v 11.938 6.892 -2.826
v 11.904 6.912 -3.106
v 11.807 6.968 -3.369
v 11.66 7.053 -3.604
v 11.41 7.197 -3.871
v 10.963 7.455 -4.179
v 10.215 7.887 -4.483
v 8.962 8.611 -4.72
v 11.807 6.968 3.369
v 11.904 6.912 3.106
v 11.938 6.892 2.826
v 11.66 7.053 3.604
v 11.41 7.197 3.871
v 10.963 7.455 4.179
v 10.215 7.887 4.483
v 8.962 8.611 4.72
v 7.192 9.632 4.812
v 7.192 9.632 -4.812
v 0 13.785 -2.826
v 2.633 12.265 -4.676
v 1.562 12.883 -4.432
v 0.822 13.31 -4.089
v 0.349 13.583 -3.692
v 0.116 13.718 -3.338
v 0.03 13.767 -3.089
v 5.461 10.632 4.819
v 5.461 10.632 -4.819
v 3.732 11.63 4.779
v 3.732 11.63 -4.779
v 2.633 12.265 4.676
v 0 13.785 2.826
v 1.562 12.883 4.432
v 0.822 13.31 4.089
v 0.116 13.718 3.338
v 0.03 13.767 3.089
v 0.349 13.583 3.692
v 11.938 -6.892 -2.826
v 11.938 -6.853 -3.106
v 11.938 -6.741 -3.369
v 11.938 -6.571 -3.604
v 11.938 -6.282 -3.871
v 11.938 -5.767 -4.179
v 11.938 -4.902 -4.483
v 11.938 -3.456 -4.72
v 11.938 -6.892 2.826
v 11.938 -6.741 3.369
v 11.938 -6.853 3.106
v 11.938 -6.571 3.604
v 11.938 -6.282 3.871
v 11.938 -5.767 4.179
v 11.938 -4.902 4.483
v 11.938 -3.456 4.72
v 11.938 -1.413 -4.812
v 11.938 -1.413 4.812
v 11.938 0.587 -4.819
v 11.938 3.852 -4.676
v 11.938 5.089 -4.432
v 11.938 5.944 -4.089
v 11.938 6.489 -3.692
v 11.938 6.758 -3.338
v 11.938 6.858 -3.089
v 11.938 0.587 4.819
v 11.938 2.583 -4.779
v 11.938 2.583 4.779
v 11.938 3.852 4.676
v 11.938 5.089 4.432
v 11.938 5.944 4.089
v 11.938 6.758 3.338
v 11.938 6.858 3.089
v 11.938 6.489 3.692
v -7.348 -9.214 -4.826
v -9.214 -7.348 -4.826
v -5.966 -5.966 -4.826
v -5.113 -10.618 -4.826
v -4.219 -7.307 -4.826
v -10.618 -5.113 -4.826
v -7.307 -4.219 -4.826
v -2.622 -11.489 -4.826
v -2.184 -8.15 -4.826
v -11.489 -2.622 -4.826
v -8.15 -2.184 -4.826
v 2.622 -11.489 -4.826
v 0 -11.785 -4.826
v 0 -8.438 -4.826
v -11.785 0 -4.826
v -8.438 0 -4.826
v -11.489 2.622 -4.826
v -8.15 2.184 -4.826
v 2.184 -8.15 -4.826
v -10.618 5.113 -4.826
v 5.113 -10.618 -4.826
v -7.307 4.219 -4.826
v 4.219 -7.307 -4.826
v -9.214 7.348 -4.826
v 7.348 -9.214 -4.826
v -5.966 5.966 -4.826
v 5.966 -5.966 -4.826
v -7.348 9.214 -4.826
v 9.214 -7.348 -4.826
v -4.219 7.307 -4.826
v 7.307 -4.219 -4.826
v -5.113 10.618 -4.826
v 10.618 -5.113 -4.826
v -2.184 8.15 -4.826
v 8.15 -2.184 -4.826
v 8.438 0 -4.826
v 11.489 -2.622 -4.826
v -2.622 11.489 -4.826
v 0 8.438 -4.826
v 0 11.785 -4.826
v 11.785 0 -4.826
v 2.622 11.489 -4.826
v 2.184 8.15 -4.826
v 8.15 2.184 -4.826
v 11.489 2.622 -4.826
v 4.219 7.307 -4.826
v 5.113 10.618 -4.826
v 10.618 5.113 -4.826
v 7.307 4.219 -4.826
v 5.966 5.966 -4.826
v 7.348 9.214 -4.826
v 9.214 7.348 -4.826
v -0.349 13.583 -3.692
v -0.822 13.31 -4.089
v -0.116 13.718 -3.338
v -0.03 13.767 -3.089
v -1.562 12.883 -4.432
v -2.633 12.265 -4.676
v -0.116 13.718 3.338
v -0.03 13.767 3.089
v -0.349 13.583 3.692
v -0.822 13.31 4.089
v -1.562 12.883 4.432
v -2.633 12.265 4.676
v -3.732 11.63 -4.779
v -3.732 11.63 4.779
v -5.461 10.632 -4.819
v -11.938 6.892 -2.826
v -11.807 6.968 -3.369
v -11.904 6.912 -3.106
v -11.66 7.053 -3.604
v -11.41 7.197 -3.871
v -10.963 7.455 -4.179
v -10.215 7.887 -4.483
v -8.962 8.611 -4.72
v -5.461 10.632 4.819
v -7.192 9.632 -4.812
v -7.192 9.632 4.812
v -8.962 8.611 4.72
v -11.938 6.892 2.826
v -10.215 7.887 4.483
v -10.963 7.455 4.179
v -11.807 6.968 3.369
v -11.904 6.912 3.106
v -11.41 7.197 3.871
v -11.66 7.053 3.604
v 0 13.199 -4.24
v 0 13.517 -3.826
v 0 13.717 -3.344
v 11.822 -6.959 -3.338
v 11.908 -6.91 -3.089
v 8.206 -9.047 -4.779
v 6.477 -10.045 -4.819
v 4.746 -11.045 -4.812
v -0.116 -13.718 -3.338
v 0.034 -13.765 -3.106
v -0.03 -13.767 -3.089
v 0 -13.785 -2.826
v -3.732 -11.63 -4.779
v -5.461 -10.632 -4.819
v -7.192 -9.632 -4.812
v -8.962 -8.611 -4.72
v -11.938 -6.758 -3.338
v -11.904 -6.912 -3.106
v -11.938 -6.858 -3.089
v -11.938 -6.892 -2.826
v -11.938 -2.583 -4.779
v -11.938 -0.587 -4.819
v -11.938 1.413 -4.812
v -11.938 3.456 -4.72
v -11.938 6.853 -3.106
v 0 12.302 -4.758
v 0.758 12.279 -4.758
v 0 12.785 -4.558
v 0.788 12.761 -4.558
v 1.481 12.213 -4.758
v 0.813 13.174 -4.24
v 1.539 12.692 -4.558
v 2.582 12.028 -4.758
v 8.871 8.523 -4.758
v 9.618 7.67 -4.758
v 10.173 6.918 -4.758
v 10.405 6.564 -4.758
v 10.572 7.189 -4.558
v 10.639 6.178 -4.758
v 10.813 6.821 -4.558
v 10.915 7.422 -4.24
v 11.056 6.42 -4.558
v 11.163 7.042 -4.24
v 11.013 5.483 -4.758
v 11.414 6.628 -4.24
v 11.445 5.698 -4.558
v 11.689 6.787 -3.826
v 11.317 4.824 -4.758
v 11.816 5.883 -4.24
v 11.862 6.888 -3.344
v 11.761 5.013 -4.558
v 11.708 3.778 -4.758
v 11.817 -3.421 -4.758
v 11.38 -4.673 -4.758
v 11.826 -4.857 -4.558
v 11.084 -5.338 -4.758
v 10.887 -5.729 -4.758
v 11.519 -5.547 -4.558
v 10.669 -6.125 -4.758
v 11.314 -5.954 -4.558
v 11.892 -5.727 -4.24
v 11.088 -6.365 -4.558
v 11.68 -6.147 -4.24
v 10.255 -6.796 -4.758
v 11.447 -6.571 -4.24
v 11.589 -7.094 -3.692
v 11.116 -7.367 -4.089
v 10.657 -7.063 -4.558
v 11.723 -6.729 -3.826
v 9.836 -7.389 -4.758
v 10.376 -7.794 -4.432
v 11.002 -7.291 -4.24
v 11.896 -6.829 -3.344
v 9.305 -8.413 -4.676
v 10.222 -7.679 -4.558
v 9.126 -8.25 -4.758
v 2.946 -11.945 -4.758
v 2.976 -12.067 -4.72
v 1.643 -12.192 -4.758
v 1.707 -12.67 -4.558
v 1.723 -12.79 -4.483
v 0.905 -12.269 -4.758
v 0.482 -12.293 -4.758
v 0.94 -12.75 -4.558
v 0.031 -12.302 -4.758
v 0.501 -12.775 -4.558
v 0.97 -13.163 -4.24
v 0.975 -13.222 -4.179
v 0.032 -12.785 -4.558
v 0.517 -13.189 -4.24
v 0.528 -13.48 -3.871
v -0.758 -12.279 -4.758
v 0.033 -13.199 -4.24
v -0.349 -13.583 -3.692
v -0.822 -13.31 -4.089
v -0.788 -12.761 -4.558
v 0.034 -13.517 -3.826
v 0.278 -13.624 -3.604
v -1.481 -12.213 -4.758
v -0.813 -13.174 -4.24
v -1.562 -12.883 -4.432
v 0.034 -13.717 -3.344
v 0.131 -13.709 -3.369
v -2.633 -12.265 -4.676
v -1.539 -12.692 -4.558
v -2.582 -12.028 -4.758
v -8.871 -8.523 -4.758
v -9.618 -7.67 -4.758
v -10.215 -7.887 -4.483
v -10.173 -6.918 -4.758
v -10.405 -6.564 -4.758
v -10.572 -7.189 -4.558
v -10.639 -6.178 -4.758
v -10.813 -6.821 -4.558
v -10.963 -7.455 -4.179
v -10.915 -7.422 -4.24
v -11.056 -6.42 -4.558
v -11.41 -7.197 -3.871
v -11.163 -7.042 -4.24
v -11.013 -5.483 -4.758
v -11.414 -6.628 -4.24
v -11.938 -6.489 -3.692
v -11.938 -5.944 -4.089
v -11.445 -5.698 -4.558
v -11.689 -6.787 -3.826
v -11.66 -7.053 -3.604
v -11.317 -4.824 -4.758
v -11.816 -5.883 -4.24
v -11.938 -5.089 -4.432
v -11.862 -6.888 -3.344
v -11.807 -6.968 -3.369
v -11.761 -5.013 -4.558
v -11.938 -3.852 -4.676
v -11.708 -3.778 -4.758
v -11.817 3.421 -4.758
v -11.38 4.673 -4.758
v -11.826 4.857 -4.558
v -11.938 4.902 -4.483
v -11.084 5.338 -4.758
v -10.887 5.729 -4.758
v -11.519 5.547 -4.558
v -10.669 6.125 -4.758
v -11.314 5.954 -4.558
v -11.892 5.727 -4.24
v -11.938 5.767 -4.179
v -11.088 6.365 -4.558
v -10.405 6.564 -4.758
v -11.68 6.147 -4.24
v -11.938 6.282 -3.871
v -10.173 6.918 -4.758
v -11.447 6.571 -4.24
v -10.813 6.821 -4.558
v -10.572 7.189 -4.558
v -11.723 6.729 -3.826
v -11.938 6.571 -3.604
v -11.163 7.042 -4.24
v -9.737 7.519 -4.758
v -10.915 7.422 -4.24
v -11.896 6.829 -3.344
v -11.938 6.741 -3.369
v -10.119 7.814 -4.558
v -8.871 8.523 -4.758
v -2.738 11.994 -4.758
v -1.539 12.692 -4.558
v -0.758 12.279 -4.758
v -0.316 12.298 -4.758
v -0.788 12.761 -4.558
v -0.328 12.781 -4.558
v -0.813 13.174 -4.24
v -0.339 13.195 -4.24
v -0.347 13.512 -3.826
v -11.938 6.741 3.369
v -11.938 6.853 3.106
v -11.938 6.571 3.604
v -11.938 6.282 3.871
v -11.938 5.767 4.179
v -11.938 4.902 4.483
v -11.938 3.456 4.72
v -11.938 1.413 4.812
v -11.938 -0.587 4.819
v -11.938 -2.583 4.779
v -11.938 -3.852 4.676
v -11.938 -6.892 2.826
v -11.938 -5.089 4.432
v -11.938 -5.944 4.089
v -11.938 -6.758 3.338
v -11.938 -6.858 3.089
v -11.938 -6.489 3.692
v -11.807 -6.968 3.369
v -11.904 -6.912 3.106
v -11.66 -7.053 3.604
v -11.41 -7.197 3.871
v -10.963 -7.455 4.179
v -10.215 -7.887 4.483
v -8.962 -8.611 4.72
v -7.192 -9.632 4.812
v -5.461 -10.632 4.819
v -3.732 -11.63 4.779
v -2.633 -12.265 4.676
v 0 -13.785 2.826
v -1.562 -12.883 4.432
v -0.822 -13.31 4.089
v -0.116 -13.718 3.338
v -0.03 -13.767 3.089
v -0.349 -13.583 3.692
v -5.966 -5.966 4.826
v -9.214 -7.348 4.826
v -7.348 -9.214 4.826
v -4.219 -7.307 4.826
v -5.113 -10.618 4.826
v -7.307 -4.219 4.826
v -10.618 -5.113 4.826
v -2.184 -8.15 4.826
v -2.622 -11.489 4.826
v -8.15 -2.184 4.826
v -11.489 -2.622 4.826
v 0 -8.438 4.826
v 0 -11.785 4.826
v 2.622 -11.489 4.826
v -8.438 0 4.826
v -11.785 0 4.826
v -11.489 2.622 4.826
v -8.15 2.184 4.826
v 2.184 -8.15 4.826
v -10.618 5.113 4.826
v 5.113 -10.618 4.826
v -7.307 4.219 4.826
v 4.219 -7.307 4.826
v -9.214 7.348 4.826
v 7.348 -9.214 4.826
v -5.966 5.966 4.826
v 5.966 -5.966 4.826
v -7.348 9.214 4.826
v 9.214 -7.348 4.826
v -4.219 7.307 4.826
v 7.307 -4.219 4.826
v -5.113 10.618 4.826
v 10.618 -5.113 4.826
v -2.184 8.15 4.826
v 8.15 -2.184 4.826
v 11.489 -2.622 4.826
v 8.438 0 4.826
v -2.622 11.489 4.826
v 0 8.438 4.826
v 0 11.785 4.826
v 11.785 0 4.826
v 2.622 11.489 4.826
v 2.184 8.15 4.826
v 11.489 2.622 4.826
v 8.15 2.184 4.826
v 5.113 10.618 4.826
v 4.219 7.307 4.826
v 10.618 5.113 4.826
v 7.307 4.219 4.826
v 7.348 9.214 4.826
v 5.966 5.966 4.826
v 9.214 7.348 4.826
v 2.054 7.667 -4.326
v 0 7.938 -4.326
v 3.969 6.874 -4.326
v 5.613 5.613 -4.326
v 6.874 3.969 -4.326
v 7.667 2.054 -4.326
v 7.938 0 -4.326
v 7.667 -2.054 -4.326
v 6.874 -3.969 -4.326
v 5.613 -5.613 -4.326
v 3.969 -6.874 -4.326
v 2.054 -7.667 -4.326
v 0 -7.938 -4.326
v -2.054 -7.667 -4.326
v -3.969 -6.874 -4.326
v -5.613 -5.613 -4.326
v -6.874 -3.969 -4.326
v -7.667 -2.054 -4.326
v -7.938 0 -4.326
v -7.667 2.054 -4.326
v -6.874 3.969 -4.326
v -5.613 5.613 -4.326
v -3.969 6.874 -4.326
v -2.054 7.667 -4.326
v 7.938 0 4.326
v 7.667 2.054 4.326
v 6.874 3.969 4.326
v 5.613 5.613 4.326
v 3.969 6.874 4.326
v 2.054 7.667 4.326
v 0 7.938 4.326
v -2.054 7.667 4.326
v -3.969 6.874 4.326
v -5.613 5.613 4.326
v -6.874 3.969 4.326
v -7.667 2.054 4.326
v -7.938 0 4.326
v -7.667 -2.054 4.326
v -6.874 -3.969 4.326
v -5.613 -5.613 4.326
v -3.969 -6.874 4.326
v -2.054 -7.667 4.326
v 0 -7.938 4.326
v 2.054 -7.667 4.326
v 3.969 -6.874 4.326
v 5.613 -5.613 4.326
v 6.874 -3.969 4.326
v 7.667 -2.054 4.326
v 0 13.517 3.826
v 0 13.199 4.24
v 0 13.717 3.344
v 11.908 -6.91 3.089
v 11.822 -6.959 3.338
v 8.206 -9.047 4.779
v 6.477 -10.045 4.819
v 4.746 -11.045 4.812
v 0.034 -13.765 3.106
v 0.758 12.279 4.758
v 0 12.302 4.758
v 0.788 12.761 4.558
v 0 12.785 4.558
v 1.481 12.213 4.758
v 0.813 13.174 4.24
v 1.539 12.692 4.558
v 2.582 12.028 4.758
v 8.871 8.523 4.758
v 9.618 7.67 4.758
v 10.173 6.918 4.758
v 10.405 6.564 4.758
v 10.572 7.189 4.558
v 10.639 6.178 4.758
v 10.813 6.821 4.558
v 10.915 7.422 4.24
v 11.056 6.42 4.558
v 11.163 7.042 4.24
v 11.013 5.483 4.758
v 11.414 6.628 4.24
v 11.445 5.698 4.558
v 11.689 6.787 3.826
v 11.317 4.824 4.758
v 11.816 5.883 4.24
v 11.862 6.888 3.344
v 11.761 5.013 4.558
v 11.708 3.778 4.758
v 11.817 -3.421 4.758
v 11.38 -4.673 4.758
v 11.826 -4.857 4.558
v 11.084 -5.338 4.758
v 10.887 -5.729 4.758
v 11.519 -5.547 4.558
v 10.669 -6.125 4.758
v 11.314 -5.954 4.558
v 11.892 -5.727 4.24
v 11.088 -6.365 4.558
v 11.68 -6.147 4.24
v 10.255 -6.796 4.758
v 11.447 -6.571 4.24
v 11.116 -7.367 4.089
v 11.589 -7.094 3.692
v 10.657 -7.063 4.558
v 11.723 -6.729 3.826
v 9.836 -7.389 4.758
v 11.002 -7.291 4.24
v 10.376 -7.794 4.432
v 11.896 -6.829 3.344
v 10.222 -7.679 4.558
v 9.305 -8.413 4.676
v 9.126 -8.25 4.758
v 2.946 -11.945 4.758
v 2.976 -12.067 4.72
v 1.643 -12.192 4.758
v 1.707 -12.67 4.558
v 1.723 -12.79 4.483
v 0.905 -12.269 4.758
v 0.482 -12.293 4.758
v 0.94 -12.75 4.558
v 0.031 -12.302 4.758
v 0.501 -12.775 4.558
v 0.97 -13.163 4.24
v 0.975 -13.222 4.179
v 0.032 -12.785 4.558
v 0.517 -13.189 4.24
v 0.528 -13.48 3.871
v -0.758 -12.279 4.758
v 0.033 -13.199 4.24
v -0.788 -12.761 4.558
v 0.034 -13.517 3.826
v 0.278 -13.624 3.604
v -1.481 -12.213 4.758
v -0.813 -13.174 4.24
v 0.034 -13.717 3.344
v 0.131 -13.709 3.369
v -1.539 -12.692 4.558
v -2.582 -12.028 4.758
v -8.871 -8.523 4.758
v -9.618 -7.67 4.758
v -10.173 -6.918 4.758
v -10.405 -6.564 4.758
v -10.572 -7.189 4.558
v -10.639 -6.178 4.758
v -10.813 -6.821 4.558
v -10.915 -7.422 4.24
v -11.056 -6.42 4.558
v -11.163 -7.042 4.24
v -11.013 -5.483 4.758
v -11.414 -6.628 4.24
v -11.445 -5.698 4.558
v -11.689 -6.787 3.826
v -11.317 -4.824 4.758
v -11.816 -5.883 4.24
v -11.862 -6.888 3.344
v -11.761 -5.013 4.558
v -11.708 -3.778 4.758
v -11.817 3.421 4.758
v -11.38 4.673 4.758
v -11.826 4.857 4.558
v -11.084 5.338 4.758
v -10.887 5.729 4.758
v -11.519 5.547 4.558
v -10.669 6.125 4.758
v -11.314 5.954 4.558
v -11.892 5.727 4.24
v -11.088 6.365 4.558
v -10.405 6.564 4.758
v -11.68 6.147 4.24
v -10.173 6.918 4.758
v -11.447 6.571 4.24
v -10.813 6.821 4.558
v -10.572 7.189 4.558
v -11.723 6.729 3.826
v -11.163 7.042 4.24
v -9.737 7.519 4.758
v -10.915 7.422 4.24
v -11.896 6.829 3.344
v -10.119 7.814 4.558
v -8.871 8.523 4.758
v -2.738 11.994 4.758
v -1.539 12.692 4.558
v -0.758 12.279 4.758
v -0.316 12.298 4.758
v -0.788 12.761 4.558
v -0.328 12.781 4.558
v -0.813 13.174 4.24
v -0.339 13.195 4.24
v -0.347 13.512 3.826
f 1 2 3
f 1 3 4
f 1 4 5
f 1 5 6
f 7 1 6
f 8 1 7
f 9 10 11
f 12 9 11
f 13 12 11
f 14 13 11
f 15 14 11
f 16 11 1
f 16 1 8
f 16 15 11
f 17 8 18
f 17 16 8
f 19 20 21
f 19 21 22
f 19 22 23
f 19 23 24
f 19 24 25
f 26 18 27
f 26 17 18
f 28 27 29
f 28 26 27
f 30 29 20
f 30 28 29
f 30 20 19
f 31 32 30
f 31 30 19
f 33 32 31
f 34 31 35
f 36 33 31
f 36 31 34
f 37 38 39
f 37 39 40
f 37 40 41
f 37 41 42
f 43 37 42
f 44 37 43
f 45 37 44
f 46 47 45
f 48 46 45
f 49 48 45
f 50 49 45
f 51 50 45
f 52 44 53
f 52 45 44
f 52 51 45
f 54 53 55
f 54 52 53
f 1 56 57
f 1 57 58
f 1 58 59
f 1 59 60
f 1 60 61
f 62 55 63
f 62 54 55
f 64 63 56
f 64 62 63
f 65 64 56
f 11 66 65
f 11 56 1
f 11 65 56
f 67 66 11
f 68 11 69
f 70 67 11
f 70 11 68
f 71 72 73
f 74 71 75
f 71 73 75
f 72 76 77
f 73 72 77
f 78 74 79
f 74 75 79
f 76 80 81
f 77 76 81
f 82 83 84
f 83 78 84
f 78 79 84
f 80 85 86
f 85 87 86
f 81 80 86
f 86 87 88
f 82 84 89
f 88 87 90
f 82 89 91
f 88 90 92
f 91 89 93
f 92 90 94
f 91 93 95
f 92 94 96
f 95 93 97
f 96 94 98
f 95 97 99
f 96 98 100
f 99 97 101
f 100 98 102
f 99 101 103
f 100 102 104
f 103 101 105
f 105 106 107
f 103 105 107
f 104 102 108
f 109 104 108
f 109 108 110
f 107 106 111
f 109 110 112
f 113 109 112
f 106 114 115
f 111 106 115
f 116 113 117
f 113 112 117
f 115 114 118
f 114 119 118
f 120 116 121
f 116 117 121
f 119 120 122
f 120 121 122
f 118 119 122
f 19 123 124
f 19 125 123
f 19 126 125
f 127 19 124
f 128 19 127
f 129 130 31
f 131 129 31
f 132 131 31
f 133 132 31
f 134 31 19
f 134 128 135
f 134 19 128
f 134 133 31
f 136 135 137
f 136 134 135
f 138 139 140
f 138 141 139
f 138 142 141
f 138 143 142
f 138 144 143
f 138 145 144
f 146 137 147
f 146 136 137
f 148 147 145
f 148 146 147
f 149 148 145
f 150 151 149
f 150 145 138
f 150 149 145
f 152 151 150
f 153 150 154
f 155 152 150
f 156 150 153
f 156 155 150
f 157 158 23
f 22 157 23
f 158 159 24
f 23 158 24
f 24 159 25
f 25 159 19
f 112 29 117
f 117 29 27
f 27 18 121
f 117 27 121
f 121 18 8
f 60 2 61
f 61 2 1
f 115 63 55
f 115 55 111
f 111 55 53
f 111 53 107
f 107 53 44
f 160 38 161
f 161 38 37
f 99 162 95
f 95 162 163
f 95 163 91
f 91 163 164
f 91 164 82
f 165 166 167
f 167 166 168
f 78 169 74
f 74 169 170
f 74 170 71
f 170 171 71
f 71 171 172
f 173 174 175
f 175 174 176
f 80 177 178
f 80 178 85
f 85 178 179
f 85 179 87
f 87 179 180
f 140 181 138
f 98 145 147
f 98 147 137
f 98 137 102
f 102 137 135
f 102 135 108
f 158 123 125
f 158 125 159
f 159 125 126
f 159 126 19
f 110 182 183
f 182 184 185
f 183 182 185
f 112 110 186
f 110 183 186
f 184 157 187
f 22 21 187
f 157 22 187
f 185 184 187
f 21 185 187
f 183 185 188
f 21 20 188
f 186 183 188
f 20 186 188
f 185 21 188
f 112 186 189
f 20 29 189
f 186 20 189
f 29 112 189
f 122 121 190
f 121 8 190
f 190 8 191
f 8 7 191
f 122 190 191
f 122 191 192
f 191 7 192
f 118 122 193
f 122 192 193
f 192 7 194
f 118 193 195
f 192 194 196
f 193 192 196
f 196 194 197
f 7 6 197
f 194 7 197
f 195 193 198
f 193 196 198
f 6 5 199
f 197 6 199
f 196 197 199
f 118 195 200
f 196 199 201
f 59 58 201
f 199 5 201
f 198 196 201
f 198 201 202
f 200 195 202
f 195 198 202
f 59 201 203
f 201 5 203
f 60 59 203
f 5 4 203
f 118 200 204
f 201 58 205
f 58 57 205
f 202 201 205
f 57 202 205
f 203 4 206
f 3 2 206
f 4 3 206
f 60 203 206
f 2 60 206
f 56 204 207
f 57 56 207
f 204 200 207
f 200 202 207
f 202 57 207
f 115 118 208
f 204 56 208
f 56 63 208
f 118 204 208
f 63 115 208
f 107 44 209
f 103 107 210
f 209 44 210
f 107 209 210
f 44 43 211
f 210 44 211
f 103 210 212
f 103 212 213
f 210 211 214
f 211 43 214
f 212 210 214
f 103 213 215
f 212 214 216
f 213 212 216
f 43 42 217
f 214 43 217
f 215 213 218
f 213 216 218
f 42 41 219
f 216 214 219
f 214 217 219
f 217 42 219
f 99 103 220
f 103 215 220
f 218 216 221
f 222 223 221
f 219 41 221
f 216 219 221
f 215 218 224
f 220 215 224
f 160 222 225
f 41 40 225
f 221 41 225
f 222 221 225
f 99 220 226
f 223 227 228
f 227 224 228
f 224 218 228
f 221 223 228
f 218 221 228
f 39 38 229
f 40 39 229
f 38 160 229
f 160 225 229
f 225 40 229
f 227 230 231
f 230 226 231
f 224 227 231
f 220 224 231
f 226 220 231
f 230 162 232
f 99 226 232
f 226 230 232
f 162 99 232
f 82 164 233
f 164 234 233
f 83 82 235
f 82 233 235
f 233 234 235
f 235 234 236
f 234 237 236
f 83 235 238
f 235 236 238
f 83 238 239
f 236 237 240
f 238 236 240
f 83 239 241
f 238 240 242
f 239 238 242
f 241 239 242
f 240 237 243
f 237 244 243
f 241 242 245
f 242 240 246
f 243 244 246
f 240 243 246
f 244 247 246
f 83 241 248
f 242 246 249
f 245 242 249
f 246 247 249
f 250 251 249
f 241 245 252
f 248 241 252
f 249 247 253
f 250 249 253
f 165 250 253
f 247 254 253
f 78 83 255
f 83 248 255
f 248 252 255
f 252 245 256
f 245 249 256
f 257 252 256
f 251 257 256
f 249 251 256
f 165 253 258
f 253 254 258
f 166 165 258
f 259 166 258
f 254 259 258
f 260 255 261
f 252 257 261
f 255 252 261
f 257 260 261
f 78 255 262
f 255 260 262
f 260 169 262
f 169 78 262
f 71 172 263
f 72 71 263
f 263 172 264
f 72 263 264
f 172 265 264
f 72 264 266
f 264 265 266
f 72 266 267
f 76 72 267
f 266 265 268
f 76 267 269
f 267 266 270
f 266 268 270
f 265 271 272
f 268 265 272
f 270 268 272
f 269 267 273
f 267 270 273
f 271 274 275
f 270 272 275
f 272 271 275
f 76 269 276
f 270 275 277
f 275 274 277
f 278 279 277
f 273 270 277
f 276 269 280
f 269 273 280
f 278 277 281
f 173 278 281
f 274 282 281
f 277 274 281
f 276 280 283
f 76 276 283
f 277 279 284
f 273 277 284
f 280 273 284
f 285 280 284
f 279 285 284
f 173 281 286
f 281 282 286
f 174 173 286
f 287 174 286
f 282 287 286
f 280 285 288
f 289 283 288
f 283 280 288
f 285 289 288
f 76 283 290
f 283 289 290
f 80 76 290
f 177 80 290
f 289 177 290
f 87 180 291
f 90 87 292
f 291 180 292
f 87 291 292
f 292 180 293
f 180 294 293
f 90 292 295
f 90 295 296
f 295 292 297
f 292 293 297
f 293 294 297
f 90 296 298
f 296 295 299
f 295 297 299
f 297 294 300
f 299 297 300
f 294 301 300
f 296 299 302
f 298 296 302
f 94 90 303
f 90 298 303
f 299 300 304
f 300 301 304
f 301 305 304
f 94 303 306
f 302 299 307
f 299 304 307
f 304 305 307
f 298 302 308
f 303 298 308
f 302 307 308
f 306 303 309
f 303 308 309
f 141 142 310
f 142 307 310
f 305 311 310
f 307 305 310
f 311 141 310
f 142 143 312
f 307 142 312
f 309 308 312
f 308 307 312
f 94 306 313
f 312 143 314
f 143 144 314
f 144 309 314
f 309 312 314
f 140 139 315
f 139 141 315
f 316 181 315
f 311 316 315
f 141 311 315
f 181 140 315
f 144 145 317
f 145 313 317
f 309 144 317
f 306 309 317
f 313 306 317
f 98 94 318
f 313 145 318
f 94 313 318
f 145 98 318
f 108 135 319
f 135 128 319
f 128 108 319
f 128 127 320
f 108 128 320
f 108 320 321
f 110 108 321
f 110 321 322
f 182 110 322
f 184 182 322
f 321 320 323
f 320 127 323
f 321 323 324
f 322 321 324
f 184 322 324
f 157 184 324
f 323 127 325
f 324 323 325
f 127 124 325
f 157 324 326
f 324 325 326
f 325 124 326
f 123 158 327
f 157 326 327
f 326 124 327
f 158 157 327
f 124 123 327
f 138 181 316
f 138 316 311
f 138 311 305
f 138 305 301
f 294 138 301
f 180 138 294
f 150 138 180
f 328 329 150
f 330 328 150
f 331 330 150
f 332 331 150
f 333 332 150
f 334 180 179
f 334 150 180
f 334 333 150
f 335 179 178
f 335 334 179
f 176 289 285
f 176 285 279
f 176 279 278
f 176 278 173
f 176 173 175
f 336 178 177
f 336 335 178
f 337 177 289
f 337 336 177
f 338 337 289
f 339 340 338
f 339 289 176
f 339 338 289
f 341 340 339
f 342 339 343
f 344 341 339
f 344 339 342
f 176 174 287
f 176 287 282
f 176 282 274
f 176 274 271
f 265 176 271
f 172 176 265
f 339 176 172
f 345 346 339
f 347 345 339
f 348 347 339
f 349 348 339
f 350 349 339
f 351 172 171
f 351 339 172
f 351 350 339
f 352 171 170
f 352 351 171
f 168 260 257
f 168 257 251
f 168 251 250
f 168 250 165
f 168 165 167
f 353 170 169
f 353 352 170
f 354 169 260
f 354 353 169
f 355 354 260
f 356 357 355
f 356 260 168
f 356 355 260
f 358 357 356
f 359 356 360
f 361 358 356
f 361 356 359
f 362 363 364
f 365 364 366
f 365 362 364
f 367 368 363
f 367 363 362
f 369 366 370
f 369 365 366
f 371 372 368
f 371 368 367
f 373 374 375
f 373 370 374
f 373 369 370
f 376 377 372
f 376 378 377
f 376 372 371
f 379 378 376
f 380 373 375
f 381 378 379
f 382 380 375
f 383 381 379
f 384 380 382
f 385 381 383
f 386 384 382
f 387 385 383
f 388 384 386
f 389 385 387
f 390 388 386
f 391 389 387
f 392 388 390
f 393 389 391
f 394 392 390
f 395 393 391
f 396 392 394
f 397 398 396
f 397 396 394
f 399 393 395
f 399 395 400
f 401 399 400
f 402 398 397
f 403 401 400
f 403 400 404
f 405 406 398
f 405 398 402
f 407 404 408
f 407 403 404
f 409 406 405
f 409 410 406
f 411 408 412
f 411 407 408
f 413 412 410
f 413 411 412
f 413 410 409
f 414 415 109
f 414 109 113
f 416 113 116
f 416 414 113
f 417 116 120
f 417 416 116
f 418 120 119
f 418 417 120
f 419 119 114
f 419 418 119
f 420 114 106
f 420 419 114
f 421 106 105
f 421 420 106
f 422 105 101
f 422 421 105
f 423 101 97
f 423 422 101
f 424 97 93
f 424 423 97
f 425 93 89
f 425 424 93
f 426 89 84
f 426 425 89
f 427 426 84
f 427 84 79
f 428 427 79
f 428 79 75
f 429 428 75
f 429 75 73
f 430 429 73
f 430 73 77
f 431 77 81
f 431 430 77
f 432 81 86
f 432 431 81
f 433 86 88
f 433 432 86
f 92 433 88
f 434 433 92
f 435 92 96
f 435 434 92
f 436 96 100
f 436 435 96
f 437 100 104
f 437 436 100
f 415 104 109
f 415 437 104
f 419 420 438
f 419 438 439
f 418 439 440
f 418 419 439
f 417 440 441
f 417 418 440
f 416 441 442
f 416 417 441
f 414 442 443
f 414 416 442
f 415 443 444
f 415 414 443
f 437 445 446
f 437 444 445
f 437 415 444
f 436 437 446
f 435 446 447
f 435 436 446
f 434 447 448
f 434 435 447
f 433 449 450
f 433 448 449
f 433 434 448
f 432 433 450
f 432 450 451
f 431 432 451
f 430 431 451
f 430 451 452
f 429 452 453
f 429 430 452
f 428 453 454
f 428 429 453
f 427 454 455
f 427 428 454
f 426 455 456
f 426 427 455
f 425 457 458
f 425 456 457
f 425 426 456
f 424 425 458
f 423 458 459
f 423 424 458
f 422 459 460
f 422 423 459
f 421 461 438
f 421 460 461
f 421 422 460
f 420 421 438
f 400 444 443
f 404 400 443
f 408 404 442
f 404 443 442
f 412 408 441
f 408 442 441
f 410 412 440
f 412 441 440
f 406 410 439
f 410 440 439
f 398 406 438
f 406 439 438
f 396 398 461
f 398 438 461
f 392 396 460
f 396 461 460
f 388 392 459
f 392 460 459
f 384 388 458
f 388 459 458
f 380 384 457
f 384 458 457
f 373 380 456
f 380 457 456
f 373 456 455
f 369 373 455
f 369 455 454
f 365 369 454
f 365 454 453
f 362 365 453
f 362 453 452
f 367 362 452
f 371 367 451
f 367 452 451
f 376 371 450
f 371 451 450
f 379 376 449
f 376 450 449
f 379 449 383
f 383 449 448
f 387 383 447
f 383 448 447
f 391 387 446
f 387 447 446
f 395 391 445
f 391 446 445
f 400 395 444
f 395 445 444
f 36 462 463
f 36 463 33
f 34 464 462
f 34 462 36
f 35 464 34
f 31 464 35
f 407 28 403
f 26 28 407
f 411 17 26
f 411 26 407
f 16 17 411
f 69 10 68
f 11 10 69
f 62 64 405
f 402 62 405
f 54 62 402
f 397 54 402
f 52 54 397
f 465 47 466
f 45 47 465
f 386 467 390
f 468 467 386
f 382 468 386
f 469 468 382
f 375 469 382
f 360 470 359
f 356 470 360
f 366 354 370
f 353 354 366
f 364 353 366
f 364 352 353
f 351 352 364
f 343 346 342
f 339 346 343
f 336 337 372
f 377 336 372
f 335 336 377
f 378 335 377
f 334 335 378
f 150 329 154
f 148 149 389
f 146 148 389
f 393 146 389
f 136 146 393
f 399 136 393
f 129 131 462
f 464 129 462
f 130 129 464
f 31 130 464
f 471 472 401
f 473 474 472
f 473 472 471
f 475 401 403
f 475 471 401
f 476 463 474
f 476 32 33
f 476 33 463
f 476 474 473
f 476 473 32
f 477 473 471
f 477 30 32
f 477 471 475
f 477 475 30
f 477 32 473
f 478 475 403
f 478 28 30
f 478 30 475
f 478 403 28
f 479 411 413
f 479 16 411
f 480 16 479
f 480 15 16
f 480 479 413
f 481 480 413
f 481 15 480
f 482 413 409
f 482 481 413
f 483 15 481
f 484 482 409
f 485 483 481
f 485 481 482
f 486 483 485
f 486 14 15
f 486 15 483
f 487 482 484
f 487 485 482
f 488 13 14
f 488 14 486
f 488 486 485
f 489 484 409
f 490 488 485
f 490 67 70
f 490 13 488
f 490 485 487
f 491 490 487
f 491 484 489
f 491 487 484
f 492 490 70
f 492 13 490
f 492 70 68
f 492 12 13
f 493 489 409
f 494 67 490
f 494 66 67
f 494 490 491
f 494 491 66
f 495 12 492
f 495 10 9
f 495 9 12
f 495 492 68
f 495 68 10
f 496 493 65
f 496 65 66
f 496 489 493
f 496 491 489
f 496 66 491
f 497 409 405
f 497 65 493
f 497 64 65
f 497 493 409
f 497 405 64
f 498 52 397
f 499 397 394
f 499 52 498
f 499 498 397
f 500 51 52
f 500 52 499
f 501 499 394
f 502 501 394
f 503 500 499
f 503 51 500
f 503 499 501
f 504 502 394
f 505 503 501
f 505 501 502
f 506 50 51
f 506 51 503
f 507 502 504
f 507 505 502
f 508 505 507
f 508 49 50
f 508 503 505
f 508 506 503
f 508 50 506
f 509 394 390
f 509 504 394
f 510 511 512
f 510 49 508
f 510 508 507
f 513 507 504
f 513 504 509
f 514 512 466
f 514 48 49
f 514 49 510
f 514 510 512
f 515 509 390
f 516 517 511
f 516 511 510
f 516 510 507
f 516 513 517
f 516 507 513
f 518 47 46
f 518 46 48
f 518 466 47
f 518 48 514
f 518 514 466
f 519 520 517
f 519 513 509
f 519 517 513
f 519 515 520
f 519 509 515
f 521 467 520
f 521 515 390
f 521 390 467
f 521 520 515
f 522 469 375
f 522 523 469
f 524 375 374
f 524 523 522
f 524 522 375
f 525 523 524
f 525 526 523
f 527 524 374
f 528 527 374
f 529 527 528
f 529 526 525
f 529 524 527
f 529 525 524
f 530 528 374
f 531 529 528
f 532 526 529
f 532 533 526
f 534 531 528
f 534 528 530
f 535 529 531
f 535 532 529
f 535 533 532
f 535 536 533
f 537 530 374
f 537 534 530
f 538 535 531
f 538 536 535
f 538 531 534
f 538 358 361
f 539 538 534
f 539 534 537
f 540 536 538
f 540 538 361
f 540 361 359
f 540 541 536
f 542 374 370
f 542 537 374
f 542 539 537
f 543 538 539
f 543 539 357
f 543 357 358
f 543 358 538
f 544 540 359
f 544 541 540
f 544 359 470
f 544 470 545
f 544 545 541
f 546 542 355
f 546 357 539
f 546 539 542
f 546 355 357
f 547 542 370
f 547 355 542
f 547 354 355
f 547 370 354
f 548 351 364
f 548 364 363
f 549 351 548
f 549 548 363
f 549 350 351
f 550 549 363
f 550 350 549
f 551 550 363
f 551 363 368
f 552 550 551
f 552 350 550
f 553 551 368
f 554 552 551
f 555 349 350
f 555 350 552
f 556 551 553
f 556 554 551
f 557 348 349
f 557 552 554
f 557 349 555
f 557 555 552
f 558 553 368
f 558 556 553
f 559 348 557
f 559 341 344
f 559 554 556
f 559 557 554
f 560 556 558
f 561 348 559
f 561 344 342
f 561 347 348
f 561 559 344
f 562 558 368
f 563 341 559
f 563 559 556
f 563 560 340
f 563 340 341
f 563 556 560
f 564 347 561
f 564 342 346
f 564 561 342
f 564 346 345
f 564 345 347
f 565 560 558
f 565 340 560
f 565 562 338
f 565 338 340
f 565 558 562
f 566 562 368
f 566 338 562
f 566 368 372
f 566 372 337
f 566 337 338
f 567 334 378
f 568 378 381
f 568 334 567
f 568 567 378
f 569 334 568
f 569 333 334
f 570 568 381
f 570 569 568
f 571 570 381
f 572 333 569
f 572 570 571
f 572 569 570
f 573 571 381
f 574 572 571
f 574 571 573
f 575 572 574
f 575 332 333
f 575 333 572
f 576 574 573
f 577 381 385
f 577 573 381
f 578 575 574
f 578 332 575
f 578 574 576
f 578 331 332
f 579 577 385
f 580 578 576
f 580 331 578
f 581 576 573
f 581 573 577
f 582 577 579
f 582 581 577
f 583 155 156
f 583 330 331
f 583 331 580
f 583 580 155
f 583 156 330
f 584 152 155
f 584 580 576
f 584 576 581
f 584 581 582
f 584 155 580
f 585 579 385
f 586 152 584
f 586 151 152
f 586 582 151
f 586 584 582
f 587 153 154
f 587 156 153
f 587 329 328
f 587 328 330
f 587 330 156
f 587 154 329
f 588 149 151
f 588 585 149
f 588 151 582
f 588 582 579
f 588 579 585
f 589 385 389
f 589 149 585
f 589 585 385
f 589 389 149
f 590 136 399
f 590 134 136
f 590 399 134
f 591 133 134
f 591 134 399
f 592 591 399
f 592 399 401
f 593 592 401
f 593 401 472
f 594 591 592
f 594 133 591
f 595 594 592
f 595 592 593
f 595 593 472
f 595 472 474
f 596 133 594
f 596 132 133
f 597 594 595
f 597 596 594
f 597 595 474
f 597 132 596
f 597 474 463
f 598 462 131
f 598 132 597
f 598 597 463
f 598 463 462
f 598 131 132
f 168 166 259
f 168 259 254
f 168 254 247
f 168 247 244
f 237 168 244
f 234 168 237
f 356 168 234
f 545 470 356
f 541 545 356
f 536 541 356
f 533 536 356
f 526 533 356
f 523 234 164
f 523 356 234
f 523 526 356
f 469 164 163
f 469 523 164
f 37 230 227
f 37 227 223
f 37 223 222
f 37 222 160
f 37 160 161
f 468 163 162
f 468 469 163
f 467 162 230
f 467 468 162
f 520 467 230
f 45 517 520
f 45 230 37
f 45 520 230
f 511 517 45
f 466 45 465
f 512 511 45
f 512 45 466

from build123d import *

# Parameters (mm, degrees)
SKETCH1_R      = 7.9375
EXTRUDE1_DEPTH = 4.826


with BuildPart() as part:
    # Sketch1 → Extrude1 (new body, symmetric)
    with BuildSketch(Plane.XY):
        Polygon((0, 13.784815027), (-11.938, 6.892407514), (-11.938, -6.892407514), (0, -13.784815027), (11.938, -6.892407514), (11.938, 6.892407514), align=None)
        Circle(SKETCH1_R, mode=Mode.SUBTRACT)
    extrude(amount=EXTRUDE1_DEPTH, both=True)

    # Sketch2 → Detail (revolve, cut)
    with BuildSketch(Plane(origin=(0, 0, 0), x_dir=(0, 0, -1), z_dir=(1, 0, 0))):
        Polygon((4.826, 7.9375), (4.826, 8.4375), (4.326, 7.9375), align=None)
        with BuildLine():
            Line((4.826, 13.784815027), (4.826, 11.784815027))
            ThreePointArc((4.826, 11.784815027), (4.240213562, 13.19902859), (2.826, 13.784815027))
            Line((2.826, 13.784815027), (4.826, 13.784815027))
        make_face()
        with BuildLine():
            Line((-2.826, 13.784815027), (-4.826, 13.784815027))
            Line((-4.826, 13.784815027), (-4.826, 11.784815027))
            ThreePointArc((-4.826, 11.784815027), (-4.240213562, 13.19902859), (-2.826, 13.784815027))
        make_face()
        Polygon((-4.326, 7.9375), (-4.826, 7.9375), (-4.826, 8.4375), align=None)
    revolve(axis=Axis((0, 0, 0), (0, 0, -1)), mode=Mode.SUBTRACT)


solid = part.part
